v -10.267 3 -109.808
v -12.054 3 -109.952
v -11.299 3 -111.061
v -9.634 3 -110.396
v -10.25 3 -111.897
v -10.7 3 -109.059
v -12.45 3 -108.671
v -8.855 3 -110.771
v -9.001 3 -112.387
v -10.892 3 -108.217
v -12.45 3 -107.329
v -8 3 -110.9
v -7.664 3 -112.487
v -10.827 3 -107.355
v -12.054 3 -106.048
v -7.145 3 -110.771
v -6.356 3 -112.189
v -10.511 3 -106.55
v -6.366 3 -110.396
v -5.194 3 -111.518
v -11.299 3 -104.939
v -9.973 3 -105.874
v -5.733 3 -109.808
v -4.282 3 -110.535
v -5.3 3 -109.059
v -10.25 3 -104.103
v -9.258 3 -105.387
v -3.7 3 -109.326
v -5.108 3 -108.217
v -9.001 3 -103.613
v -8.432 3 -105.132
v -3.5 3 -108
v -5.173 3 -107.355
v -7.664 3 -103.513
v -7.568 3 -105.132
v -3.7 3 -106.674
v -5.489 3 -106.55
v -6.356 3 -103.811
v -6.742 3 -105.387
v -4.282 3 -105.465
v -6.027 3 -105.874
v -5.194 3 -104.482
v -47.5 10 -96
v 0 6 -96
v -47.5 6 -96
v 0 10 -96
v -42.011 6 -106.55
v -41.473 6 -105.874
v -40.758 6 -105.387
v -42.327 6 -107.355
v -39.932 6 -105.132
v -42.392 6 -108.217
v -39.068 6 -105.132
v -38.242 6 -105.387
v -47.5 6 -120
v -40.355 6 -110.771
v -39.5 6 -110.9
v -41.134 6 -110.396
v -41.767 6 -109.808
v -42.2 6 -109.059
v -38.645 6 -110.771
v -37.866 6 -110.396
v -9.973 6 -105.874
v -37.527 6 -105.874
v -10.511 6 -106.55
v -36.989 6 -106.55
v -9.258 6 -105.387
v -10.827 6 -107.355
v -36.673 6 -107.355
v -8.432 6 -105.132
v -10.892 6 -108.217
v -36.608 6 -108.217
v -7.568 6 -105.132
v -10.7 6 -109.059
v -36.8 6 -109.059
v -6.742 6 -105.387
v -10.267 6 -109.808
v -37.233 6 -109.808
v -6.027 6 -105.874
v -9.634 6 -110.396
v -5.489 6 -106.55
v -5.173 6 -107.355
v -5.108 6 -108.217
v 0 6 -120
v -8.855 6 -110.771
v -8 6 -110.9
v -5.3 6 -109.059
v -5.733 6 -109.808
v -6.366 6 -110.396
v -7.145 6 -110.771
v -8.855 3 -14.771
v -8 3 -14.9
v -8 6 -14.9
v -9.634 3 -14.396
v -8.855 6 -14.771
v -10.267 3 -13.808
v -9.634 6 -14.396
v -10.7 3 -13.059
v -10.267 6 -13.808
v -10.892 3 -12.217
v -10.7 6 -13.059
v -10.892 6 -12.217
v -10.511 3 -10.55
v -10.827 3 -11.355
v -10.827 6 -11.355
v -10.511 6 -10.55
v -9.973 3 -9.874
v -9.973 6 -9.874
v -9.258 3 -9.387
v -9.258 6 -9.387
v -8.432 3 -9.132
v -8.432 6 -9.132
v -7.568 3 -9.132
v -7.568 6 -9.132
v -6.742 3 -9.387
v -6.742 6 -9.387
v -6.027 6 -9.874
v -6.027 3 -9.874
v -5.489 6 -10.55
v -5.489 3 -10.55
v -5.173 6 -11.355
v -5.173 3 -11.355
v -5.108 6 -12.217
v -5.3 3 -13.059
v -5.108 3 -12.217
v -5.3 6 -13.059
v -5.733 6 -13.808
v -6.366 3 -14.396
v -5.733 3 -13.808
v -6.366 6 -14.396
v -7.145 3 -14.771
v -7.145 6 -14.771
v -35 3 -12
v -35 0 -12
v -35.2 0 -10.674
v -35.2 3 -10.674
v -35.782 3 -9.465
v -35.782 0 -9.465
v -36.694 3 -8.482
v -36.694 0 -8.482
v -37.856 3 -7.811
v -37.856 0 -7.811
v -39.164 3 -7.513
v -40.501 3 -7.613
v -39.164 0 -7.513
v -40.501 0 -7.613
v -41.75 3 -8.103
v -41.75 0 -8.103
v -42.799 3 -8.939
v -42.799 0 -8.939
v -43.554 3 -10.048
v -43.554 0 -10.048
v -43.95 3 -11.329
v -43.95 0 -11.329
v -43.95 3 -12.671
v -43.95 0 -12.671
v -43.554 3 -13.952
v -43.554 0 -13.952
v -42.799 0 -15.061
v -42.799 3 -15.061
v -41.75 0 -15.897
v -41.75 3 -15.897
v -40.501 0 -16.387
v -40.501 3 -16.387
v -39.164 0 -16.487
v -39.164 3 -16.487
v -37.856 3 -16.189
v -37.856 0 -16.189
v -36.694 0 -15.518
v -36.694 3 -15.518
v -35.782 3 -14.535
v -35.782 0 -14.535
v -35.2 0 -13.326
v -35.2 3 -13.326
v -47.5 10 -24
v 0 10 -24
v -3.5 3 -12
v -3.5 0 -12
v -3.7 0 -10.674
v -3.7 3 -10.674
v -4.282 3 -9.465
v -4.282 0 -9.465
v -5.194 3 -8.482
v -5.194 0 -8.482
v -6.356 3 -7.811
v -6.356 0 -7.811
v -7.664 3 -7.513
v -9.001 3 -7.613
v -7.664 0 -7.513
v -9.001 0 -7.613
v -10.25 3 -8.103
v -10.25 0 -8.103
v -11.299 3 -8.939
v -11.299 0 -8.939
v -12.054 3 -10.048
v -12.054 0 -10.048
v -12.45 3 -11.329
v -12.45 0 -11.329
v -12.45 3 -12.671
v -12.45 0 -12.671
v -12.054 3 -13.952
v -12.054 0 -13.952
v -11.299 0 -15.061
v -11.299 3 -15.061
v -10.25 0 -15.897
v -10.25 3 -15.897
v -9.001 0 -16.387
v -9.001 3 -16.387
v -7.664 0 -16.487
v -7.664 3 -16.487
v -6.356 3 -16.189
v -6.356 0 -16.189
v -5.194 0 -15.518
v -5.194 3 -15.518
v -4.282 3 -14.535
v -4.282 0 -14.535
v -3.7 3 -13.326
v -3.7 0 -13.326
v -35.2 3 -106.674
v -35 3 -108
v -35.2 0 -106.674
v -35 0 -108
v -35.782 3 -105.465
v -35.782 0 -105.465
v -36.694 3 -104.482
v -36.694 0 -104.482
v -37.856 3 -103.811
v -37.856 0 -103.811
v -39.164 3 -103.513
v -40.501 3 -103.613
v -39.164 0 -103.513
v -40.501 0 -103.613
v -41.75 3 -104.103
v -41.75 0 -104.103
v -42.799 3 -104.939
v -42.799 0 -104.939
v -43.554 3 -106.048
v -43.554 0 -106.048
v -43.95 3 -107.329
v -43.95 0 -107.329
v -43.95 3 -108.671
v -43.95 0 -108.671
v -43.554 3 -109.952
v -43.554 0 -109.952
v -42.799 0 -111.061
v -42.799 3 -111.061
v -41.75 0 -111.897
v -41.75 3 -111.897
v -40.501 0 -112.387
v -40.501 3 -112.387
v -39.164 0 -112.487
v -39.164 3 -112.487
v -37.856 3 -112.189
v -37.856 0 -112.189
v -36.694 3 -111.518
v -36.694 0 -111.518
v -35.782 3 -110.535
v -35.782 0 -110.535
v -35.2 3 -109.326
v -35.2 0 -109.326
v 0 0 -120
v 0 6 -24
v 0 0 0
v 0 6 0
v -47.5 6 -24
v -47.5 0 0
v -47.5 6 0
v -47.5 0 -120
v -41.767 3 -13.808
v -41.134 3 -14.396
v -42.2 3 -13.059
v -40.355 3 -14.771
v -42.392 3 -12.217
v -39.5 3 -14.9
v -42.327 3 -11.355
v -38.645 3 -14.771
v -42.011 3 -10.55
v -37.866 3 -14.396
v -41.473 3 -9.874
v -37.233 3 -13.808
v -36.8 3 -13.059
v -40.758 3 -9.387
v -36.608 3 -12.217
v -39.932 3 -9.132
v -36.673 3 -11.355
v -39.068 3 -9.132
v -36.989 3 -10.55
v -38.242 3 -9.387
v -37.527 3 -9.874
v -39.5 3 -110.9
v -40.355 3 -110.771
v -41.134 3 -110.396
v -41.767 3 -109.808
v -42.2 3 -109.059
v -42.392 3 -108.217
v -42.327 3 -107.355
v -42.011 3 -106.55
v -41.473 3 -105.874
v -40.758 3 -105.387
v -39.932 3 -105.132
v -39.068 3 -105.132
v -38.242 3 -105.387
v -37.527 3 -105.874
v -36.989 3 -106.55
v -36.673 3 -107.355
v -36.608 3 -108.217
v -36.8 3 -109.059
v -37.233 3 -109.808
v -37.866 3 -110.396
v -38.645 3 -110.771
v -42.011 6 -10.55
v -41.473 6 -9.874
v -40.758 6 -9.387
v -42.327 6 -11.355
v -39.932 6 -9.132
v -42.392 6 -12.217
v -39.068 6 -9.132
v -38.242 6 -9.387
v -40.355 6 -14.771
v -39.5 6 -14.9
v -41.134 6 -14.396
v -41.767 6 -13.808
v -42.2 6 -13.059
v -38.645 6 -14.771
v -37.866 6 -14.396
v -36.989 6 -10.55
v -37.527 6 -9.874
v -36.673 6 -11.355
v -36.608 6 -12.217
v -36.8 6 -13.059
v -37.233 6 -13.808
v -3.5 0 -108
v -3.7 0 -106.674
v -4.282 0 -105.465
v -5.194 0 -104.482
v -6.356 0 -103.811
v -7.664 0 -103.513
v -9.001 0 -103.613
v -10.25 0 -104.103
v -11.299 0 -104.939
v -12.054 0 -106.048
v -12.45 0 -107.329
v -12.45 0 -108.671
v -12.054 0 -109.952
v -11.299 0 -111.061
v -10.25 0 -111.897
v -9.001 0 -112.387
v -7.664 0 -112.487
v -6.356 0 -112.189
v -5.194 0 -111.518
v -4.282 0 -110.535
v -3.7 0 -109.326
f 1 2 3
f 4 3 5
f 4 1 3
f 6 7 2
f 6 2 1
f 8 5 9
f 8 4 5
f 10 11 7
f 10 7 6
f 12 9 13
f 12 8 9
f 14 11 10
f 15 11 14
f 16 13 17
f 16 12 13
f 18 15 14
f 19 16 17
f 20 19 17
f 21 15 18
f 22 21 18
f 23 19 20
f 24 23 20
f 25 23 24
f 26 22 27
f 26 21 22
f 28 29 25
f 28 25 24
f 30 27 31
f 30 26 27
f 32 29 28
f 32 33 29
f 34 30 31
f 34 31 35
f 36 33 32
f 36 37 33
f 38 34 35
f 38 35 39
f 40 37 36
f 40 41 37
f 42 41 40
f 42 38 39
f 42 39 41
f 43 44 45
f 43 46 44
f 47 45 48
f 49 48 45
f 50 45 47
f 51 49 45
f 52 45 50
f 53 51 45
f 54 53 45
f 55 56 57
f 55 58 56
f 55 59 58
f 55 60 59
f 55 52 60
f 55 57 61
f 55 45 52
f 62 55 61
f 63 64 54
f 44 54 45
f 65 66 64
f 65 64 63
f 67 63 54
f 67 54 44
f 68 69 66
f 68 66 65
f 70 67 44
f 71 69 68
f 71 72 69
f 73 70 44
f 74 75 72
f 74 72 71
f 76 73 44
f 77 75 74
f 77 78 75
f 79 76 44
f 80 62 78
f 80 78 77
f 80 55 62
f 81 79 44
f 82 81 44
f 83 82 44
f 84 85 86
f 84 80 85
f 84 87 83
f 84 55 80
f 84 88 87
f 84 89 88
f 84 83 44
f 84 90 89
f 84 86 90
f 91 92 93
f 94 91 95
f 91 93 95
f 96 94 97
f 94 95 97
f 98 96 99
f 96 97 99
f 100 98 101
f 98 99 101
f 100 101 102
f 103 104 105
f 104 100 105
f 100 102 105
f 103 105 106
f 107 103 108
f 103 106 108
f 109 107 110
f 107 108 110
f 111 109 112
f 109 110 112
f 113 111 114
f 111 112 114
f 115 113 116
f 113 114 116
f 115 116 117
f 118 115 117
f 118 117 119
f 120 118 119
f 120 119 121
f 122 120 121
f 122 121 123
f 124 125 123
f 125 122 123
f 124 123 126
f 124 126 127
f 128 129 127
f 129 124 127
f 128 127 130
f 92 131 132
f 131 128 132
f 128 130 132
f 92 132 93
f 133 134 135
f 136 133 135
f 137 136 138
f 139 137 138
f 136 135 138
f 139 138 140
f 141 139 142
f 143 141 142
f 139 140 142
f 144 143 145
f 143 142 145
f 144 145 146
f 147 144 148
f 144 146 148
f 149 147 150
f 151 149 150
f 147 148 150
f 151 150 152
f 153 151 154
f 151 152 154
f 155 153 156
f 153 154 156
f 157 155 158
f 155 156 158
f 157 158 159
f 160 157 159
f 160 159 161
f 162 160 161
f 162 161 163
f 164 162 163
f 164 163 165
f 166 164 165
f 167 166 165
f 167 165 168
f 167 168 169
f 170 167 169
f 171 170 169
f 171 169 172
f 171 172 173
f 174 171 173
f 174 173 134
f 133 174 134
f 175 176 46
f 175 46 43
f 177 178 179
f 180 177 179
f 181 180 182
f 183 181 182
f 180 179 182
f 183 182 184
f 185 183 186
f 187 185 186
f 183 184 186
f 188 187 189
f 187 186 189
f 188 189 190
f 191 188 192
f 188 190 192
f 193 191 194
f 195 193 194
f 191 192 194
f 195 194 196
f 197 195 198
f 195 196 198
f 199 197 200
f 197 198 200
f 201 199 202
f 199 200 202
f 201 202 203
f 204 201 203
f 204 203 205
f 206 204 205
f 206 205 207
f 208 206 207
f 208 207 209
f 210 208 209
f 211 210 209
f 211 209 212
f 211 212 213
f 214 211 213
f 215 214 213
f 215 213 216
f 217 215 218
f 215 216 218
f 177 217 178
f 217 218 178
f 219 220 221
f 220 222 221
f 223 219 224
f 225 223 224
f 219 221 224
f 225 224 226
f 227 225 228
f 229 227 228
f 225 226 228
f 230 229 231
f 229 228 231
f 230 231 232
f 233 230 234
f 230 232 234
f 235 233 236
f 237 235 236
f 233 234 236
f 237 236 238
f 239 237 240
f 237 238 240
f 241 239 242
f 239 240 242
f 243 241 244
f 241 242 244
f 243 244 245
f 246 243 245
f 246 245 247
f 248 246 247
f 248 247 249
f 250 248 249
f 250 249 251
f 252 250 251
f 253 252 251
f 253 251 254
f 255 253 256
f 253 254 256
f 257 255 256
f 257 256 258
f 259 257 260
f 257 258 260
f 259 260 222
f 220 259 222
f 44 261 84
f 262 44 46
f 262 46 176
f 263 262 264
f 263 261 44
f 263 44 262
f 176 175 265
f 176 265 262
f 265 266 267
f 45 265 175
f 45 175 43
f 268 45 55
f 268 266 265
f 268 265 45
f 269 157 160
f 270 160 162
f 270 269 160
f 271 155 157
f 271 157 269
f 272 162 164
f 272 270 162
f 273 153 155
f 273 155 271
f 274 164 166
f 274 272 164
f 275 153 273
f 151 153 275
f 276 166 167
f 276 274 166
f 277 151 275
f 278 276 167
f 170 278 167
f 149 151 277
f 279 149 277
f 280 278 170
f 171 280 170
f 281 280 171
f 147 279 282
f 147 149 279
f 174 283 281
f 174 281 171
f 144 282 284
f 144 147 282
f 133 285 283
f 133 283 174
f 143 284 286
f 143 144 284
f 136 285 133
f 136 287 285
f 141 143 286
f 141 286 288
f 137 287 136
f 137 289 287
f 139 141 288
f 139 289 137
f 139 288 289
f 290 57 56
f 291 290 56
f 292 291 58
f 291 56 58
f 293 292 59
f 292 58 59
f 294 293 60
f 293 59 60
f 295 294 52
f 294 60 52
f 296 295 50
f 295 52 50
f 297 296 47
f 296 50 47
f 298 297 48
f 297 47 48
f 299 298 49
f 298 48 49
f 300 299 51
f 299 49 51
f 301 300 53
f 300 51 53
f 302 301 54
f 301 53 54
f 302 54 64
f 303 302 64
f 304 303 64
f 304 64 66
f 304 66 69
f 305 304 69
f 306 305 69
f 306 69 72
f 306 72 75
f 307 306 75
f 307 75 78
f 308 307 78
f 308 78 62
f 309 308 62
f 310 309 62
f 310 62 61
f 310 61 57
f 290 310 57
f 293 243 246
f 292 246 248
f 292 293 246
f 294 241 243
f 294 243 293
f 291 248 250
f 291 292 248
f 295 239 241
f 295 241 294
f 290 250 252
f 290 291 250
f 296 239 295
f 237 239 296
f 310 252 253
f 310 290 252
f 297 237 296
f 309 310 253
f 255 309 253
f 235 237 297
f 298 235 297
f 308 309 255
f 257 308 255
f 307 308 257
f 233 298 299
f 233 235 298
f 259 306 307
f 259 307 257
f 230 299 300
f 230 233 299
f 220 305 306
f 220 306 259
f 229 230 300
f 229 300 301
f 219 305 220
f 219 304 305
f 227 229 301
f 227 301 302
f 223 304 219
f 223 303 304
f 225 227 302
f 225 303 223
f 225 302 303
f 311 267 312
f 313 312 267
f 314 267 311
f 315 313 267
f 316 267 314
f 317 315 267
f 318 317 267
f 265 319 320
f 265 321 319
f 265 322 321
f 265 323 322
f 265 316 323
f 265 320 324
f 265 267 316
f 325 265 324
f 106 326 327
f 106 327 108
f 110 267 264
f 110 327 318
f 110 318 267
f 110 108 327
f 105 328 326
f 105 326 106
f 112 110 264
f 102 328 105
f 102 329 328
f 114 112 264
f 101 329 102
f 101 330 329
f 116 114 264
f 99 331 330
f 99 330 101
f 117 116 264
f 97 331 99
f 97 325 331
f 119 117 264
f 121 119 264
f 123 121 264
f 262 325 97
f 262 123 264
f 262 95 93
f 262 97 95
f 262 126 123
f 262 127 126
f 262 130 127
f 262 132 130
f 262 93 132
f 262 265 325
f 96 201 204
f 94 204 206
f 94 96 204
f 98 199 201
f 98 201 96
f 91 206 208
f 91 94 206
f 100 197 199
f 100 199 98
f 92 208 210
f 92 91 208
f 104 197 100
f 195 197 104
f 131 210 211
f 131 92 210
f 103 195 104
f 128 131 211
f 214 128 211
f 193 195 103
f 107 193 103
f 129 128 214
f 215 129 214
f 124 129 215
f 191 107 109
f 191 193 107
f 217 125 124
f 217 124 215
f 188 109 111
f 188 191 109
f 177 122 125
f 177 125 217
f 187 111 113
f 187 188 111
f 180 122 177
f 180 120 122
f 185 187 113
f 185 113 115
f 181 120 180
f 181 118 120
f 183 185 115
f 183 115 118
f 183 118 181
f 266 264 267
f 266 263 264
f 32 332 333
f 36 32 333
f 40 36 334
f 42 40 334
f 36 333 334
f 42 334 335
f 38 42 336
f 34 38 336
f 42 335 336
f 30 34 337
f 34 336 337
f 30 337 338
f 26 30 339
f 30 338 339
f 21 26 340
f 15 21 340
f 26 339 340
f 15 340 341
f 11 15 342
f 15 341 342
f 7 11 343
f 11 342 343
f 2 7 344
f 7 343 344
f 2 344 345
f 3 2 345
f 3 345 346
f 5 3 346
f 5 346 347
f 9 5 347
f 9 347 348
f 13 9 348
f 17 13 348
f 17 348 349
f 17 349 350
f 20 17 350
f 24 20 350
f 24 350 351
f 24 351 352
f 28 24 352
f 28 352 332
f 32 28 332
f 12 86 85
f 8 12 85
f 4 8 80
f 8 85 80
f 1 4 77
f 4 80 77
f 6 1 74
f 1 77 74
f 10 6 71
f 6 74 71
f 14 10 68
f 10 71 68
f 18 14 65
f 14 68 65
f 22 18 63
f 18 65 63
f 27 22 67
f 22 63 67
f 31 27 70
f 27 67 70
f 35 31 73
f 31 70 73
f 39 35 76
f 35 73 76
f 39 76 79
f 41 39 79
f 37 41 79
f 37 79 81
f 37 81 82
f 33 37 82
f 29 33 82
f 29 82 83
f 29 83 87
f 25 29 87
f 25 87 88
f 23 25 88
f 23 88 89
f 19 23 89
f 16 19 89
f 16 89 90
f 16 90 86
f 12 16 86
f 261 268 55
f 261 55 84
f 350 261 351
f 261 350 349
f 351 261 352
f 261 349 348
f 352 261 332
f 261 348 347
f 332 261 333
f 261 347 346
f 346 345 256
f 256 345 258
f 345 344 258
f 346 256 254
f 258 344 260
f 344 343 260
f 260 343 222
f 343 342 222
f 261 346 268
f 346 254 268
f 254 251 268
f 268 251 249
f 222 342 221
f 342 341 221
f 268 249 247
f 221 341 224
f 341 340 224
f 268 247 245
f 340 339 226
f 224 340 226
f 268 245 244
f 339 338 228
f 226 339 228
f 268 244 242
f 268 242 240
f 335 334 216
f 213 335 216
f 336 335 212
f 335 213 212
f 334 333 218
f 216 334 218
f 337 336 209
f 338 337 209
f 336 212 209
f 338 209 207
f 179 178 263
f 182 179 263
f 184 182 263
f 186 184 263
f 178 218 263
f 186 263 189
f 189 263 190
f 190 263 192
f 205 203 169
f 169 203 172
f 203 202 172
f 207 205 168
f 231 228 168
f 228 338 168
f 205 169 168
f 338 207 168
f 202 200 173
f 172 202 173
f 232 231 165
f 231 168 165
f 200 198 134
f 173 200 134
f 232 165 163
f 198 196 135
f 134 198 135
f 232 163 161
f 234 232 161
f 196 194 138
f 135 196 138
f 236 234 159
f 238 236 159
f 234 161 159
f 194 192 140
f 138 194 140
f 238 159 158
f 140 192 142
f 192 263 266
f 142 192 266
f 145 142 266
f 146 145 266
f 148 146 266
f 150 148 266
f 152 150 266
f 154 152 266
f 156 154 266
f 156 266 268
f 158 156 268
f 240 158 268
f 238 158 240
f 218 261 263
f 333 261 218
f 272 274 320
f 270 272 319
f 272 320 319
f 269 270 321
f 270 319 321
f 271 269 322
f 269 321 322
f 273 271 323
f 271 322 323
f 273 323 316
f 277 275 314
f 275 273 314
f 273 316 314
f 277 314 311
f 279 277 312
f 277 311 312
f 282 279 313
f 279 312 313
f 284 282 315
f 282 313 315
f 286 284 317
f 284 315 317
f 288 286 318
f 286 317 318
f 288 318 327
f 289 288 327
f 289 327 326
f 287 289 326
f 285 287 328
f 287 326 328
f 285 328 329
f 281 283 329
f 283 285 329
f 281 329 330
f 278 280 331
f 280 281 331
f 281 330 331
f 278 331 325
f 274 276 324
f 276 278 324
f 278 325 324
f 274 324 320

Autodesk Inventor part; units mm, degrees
ref_plane "YZ Plane" through (0, 0, 0) normal (1, 0, 0) x (0, 1, 0)
ref_plane "XZ Plane" through (0, 0, 0) normal (0, 1, 0) x (-1, 0, 0)
ref_plane "XY Plane" through (0, 0, 0) normal (0, 0, 1) x (1, 0, 0)
sketch "スケッチ1" plane through (0, 0, 0) normal (0, 1, 0) x (-1, 0, 0)
  line L0 (0, 0) -> (47.5, 0)
  line L1 (47.5, 0) -> (47.5, -120)
  line L2 (47.5, -120) -> (0, -120)
  line L3 (0, -120) -> (0, 0)
  dimension "d0" = 47.5
  dimension "d1" = 120
extrude "押し出し1" add sketch "スケッチ1" along normal blind 10
ref_plane "作業平面1" through (0, 10, 0) normal (0, 1, 0) x (1, 0, 0)
sketch "スケッチ2" plane through (0, 10, 0) normal (0, 1, 0) x (1, 0, 0)
  line L0 (0, 120) -> (-47.5, 120) projected
  line L1 (0, 0) -> (0, 120) projected
  line L2 (-47.5, 120) -> (0, 120)
  line L3 (0, 120) -> (0, 96)
  line L4 (0, 96) -> (-47.5, 96)
  line L5 (-47.5, 96) -> (-47.5, 120)
  line L6 (-47.5, 120) -> (-47.5, 0) projected
  line L7 (0, 0) -> (-47.5, 0)
  line L8 (-47.5, 0) -> (-47.5, 24)
  line L9 (-47.5, 24) -> (0, 24)
  line L10 (0, 24) -> (0, 0)
  point P0 (0, 24)
  dimension "d5" = 24
  dimension "d6" = 24
  dimension "d7" = 72
extrude "押し出し2" cut sketch "スケッチ2" against normal blind 4 contours L1 L4 L5 L0 | L1 L7 L6 L9
ref_plane "作業平面2" through (0, 0, 0) normal (0, -1, 0) x (1, 0, 0)
sketch "スケッチ3" plane through (0, 0, 0) normal (0, -1, 0) x (1, 0, 0)
  line L0 (-47.5, 0) -> (0, 0) projected
  line L1 (0, -120) -> (-47.5, -120) projected
  line L2 (-47.5, -120) -> (-47.5, 0) projected
  line L3 (0, 0) -> (0, -120) projected
  point P0 (-39.5, -12)
  point P1 (-8, -12)
  point P2 (-39.5, -108)
  point P3 (-8, -108)
  dimension "d11" = 12
  dimension "d12" = 12
  dimension "d13" = 12
  dimension "d14" = 12
  dimension "d15" = 8
  dimension "d16" = 8
  dimension "d17" = 8
  dimension "d18" = 8
hole "穴1" at (-39.5, 0, -12) at (-8, 0, -12) at (-39.5, 0, -108) at (-8, 0, -108) direction (0, 1, 0) diameter 5.8 depth 7
sketch "スケッチ4" plane through (0, 0, 0) normal (0, -1, 0) x (1, 0, 0)
  circle A0 centre (-8, -12) radius 2.9 projected
  circle A1 centre (-8, -12) radius 4.5
  circle A2 centre (-39.5, -12) radius 2.9 projected
  circle A3 centre (-39.5, -12) radius 4.5
  circle A4 centre (-39.5, -108) radius 2.9 projected
  circle A5 centre (-39.5, -108) radius 4.5
  circle A6 centre (-8, -108) radius 2.9 projected
  circle A7 centre (-8, -108) radius 4.5
  point P0 (0, 0)
  dimension "d26" = 9
  dimension "d27" = 9
  dimension "d28" = 9
  dimension "d29" = 9
extrude "押し出し3" cut sketch "スケッチ4" against normal blind 3
properties part number "motor_rot_born2"
